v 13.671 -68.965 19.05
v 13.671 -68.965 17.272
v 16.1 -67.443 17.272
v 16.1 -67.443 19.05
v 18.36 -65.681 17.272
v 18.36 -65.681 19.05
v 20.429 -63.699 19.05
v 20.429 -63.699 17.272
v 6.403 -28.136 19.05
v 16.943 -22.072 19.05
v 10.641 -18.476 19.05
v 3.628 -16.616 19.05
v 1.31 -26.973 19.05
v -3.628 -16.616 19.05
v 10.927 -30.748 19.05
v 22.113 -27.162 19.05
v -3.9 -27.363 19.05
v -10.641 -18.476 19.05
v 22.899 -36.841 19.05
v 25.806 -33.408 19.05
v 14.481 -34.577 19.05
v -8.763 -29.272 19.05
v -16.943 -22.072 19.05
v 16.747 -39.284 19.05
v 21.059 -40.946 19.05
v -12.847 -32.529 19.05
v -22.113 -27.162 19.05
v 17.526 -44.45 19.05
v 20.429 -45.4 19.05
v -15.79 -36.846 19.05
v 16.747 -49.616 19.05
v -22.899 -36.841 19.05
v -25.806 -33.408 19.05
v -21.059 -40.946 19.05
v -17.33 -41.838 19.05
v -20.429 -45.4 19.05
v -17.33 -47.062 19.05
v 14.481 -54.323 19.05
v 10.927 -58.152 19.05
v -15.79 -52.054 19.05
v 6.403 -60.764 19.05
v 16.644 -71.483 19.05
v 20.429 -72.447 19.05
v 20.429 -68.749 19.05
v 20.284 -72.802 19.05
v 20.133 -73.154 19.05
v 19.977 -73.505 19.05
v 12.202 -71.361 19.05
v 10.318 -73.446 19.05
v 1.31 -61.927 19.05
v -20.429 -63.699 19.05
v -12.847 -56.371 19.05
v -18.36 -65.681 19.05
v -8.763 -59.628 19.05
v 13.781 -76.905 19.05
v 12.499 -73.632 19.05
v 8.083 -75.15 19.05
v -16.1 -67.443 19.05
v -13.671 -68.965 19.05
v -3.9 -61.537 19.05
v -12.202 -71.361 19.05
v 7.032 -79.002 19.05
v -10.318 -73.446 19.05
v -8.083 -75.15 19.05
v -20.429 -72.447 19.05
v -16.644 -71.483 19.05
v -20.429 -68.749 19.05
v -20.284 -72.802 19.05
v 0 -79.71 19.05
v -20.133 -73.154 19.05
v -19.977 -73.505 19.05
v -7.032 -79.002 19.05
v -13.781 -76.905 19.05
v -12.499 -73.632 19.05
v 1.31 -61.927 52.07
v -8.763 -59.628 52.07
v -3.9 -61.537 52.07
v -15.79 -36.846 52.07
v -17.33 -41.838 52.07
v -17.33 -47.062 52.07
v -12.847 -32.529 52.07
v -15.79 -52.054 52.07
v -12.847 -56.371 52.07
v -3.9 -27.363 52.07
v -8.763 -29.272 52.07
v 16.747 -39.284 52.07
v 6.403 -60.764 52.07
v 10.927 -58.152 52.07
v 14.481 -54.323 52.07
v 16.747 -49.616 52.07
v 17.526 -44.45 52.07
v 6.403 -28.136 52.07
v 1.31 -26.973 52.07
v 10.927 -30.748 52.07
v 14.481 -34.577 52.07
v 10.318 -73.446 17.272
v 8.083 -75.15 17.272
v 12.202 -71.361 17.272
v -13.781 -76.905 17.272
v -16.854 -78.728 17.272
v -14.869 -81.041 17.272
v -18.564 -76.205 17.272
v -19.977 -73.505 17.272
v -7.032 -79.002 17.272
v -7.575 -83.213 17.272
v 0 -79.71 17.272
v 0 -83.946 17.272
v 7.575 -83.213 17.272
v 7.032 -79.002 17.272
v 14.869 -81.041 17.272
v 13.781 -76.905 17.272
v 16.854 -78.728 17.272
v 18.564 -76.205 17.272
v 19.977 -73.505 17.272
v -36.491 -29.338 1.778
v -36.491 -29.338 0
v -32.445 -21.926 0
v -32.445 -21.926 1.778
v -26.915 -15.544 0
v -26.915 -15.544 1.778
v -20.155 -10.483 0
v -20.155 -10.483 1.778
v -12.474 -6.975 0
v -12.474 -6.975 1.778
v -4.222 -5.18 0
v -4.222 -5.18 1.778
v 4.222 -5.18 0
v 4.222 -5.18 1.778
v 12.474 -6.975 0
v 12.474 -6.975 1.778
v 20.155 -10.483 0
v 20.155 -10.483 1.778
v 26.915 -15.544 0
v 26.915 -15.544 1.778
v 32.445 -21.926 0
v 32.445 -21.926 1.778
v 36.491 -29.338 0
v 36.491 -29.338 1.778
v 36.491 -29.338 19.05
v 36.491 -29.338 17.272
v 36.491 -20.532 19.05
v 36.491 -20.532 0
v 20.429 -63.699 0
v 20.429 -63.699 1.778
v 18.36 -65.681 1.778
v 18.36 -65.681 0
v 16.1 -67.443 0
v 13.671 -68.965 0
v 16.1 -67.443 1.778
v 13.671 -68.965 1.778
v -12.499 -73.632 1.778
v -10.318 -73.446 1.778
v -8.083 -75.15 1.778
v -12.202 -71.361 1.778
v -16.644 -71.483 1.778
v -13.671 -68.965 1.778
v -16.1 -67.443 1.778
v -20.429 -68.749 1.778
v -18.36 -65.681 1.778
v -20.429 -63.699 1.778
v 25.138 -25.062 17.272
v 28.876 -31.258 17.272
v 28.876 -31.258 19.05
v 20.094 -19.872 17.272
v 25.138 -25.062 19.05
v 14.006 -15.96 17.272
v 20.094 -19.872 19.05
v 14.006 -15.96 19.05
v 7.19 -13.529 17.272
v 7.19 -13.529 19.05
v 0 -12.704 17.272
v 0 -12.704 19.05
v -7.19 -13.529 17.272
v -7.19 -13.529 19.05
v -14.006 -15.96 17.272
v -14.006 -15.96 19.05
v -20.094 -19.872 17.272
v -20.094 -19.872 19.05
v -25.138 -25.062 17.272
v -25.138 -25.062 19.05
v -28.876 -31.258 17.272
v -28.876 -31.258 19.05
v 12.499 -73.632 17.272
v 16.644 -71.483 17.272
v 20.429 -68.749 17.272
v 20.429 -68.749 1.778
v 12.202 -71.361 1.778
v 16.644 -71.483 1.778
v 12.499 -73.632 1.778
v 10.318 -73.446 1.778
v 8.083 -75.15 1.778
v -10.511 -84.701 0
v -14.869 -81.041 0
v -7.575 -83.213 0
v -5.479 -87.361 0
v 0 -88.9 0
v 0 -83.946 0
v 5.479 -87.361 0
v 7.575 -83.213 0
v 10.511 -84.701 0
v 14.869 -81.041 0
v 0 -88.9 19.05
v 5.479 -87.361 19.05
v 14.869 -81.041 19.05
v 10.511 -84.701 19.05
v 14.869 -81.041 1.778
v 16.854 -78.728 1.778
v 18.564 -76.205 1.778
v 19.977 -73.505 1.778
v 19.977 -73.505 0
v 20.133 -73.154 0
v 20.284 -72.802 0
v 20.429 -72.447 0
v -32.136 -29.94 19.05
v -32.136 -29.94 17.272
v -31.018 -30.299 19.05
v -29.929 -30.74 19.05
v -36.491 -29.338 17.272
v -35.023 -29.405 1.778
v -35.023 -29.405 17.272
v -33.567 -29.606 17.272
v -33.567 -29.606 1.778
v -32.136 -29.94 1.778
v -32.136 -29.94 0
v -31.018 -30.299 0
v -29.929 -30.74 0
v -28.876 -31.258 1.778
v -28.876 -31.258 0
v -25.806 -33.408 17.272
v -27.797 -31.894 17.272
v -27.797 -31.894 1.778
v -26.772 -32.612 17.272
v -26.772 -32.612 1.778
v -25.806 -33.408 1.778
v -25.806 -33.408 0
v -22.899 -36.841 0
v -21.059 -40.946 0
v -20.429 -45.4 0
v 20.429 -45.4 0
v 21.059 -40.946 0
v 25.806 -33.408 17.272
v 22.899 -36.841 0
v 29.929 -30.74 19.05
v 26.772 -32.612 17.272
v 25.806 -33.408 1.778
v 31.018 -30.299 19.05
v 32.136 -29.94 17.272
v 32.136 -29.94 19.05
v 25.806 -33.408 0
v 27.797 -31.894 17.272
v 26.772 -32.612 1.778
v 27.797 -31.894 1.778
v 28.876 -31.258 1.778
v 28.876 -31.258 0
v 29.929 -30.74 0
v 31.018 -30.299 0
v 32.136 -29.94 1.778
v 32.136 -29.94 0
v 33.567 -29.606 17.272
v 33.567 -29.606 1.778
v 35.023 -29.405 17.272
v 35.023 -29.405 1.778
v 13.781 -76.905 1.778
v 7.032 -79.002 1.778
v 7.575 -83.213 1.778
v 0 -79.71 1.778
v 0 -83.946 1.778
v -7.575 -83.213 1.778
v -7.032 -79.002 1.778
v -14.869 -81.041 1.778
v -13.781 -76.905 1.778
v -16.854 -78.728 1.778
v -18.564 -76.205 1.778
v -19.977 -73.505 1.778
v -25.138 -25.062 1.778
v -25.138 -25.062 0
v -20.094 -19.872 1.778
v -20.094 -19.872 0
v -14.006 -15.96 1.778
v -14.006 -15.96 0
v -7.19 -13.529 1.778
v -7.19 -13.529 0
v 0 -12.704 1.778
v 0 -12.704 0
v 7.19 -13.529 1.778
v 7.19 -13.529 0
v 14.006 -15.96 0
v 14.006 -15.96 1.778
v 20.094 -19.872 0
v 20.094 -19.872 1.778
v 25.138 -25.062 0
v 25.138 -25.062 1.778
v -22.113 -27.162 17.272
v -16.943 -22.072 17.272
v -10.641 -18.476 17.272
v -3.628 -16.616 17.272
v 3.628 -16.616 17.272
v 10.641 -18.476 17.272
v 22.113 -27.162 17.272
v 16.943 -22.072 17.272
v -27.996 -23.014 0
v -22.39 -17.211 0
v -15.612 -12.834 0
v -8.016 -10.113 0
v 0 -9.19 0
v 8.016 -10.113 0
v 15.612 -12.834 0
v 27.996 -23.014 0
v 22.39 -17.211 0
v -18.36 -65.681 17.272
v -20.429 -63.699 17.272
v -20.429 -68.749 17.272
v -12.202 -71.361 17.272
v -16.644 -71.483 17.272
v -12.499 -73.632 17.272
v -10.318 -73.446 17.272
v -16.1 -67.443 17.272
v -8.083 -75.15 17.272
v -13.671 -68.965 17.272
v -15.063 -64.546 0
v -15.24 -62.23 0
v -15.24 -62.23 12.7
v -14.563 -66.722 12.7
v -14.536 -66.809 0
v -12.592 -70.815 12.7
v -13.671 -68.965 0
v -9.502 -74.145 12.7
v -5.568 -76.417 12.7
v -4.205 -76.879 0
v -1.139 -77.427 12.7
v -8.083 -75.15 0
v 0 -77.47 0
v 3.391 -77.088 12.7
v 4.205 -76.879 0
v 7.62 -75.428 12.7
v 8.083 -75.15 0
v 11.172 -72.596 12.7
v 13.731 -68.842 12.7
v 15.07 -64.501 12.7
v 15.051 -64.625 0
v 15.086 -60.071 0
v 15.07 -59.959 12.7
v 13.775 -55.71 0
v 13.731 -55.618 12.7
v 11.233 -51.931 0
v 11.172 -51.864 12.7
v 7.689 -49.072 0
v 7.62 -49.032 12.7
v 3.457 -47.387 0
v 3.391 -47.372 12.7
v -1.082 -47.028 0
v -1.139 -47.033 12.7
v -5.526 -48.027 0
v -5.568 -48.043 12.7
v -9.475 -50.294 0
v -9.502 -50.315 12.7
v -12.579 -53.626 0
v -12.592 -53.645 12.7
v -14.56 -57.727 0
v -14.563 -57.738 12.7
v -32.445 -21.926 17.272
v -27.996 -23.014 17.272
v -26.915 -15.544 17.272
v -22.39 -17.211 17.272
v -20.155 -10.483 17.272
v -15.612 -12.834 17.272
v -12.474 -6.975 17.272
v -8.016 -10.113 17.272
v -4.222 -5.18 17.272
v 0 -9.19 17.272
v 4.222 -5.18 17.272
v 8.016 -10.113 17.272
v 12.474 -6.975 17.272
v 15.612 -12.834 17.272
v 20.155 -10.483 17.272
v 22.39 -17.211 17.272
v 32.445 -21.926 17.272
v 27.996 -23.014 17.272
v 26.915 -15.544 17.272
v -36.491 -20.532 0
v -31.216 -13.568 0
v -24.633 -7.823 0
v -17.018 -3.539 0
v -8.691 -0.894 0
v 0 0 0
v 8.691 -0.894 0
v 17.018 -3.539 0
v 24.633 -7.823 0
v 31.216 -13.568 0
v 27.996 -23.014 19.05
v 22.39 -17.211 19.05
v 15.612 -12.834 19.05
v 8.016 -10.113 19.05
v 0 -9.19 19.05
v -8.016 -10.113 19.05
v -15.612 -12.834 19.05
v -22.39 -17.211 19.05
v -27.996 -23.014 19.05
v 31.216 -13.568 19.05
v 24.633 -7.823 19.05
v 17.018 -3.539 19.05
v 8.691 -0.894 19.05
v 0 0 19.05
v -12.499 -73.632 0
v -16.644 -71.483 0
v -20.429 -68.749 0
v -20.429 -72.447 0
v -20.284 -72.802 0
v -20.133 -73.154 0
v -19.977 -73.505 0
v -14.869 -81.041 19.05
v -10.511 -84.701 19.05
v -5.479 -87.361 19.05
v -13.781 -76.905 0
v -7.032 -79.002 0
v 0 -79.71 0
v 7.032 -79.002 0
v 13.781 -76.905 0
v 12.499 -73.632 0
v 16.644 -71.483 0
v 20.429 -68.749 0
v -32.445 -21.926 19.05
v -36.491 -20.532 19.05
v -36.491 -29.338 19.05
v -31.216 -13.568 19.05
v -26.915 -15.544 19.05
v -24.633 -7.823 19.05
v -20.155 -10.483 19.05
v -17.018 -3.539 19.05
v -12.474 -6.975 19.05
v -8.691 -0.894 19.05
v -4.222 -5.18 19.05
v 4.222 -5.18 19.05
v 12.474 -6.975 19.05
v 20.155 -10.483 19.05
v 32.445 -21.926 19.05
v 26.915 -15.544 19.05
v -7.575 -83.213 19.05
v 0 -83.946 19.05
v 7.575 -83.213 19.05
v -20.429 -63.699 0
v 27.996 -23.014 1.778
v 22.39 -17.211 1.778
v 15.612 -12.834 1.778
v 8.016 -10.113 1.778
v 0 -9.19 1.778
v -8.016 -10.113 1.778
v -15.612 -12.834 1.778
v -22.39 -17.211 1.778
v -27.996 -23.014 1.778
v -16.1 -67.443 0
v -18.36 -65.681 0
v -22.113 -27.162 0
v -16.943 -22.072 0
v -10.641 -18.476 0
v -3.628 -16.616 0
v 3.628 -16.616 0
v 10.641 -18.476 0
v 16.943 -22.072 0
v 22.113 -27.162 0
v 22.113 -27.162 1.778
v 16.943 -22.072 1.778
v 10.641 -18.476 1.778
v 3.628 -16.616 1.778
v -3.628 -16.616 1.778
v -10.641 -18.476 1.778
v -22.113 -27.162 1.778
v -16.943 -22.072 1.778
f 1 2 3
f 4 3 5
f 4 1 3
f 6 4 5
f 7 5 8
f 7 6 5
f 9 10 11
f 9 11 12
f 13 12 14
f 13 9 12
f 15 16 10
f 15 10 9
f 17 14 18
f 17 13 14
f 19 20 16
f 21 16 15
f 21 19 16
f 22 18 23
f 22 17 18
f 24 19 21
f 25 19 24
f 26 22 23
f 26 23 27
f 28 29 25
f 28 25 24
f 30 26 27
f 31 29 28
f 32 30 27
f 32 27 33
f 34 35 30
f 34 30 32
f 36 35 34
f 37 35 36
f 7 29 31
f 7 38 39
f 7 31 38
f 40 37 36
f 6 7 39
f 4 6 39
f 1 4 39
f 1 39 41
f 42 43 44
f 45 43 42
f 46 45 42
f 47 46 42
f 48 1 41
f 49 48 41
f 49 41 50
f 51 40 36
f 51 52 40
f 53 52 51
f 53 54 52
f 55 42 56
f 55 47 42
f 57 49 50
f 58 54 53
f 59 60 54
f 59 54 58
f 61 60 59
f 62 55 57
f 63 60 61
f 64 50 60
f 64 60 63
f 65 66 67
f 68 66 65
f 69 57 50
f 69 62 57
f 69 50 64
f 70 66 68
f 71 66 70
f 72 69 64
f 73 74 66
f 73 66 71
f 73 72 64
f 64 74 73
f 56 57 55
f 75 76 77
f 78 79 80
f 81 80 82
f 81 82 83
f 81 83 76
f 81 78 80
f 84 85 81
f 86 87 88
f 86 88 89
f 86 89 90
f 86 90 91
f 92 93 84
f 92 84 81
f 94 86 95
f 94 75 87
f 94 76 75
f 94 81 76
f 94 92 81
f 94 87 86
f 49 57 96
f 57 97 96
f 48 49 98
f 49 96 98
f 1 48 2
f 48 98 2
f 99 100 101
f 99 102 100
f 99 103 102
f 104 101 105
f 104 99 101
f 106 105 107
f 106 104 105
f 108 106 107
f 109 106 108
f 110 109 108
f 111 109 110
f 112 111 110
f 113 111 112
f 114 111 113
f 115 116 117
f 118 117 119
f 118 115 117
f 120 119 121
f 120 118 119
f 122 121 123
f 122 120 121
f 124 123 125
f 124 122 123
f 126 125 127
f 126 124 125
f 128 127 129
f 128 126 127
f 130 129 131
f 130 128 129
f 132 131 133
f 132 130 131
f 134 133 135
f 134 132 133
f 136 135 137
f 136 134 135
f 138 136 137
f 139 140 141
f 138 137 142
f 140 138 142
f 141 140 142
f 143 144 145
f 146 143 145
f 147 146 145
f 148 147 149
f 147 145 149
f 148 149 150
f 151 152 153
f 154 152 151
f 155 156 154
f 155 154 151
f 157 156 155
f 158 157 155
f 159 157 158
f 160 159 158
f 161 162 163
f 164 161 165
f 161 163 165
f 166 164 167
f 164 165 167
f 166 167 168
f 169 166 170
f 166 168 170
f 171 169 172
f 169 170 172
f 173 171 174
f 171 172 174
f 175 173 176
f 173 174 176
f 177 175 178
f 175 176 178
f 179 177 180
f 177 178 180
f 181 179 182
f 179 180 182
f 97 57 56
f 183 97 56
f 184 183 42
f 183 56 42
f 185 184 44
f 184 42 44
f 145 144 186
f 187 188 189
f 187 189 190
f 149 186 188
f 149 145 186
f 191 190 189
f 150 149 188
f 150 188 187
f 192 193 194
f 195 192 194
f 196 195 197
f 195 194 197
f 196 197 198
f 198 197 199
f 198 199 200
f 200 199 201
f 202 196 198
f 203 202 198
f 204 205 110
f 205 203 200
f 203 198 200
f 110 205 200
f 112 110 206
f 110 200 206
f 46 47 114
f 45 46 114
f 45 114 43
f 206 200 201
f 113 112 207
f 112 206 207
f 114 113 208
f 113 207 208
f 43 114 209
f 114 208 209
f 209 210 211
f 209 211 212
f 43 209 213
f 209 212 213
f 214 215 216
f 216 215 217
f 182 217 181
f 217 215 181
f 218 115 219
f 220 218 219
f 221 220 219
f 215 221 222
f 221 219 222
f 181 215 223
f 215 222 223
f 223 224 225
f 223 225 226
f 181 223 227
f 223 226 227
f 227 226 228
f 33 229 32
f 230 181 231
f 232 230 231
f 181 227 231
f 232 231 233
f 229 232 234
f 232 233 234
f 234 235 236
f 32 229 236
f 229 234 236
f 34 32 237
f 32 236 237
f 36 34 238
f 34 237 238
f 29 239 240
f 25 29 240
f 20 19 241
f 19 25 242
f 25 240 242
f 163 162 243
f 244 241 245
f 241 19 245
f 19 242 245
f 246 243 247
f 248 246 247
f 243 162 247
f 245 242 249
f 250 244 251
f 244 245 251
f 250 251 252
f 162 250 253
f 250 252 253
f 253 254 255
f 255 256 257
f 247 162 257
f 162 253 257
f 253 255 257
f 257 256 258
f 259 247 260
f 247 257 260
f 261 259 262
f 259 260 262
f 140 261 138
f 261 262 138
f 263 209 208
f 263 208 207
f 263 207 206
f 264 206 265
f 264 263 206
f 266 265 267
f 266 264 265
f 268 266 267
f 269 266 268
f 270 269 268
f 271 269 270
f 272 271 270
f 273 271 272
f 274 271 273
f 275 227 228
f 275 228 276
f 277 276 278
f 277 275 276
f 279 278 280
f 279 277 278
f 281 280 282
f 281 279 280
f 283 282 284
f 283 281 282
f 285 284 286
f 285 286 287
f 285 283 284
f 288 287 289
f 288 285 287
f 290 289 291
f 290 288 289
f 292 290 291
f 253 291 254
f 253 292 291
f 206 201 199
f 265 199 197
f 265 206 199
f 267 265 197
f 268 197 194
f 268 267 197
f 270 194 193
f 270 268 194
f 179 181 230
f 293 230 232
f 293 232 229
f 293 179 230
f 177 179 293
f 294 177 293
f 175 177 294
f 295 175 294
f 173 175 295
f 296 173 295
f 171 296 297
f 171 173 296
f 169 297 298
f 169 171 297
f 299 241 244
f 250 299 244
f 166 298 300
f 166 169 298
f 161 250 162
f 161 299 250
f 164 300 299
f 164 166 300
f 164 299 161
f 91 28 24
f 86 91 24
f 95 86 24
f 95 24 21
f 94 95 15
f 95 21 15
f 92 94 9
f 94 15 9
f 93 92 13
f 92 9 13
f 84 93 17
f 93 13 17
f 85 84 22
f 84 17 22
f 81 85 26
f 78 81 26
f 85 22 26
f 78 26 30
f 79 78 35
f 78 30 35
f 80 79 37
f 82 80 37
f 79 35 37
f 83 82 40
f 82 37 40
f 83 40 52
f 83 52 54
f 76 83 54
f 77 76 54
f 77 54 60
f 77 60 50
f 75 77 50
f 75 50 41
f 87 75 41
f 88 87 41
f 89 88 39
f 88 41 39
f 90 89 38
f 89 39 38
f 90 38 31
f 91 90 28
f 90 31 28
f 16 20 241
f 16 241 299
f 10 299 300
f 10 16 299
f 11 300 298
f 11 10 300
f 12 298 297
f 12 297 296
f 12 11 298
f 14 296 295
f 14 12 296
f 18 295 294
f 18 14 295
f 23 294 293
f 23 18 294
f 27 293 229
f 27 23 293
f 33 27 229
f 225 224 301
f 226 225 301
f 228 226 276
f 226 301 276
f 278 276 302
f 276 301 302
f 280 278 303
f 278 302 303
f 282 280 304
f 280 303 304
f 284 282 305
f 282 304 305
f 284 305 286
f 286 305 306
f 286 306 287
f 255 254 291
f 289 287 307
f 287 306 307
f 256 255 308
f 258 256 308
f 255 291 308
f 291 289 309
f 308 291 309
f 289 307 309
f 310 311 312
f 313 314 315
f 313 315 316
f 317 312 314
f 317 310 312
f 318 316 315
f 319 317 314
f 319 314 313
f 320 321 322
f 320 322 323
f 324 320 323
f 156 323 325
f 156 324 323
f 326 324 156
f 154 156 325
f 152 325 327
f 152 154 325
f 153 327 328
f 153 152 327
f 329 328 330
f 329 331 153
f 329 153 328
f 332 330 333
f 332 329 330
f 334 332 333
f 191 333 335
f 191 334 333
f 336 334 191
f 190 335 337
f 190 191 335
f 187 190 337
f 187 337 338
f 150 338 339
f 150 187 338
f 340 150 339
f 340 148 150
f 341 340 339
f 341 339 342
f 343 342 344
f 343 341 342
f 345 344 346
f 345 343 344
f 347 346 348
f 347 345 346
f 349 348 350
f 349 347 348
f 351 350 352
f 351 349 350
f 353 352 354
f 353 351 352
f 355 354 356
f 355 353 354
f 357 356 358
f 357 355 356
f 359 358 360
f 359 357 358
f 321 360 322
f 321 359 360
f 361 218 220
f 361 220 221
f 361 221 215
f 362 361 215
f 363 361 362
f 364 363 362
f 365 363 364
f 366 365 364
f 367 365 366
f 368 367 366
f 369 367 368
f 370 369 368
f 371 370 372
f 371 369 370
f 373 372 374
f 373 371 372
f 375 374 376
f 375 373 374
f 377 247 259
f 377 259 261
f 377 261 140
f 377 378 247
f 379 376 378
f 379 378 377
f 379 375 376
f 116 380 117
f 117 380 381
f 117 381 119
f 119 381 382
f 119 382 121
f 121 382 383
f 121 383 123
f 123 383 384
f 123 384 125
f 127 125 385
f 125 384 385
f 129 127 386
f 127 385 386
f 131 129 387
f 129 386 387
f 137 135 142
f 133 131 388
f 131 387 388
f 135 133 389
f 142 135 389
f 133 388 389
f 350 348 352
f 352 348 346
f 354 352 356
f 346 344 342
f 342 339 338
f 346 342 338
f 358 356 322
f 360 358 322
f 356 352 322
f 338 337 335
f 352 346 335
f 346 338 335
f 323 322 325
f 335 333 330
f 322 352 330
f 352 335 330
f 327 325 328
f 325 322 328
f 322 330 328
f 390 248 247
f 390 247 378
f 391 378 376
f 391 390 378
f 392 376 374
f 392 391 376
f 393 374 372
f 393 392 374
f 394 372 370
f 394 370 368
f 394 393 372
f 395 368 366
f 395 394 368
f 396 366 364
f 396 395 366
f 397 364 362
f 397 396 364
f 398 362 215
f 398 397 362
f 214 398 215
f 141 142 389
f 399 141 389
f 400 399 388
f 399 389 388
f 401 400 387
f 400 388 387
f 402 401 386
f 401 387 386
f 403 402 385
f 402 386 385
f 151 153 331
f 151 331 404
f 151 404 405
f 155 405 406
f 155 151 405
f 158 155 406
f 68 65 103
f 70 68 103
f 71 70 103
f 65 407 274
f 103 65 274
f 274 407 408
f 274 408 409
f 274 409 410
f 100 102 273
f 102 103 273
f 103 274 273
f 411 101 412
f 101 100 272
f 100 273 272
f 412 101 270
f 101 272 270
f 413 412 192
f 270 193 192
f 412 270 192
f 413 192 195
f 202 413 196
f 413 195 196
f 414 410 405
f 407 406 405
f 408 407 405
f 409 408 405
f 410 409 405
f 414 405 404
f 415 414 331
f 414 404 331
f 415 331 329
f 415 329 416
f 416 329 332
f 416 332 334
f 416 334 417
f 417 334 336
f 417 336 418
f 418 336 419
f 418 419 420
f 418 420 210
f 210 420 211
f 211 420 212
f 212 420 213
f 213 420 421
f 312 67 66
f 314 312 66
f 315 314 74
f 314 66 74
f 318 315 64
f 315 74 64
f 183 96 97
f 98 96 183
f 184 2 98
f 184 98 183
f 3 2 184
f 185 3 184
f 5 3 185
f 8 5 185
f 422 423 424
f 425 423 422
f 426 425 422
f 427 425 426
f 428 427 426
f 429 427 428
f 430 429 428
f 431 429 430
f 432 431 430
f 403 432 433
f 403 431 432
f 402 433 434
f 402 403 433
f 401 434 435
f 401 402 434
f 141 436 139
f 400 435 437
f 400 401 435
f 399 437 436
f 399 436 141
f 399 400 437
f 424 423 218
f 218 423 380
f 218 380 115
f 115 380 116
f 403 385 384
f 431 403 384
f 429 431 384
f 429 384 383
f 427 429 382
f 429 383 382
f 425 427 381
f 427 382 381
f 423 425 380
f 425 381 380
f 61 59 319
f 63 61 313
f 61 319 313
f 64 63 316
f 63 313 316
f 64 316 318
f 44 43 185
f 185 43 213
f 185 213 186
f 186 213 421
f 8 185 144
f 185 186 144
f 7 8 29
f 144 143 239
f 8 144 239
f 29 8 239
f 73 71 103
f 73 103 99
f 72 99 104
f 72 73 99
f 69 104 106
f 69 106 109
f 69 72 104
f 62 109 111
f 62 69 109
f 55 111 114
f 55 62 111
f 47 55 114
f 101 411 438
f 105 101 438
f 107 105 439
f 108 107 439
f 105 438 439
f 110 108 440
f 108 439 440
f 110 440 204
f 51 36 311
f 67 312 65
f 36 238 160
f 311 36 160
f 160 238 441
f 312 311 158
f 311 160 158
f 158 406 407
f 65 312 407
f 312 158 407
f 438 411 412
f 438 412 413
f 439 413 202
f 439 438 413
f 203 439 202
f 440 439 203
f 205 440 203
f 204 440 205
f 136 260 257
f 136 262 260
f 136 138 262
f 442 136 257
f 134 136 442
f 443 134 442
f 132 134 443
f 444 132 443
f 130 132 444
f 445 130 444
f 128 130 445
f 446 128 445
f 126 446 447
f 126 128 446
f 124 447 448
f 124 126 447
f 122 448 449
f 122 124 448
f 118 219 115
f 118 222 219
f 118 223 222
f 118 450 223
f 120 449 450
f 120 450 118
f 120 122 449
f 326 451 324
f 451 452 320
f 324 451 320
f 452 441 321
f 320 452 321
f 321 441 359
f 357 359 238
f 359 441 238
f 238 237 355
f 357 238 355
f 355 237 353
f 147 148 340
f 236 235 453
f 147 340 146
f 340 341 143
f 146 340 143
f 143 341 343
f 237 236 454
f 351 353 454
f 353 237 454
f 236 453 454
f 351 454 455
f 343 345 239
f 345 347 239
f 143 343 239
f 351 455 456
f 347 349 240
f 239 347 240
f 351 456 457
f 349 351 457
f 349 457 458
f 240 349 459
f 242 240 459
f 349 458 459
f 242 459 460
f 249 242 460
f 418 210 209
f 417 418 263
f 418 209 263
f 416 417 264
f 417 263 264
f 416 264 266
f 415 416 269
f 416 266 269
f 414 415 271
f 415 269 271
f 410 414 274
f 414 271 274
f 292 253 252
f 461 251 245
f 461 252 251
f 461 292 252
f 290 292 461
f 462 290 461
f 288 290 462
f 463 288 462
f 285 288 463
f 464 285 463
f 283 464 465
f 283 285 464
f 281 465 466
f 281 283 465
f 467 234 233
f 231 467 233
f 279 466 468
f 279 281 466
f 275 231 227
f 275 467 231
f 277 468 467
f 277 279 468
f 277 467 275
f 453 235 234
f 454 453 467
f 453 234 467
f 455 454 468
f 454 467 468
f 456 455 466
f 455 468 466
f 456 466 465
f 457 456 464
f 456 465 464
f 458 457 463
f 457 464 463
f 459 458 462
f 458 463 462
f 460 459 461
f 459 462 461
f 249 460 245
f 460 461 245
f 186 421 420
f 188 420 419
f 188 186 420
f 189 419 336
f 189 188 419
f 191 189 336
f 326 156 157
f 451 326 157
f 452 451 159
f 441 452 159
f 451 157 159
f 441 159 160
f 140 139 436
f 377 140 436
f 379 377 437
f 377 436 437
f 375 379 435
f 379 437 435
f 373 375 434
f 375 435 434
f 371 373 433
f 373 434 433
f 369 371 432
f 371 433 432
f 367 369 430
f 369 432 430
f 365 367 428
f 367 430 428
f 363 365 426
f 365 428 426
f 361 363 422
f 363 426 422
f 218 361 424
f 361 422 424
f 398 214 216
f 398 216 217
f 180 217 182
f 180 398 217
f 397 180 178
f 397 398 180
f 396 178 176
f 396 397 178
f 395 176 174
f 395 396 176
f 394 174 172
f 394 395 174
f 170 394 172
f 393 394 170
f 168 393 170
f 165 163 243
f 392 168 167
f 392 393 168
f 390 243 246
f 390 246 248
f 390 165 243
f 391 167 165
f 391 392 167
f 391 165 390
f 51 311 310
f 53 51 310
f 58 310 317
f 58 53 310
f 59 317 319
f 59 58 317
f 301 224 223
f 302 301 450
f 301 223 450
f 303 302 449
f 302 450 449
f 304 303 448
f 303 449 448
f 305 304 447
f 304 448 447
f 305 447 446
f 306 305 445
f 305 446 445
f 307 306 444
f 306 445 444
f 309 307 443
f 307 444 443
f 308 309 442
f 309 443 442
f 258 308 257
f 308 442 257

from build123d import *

# Parameters (mm, degrees)
SKETCH2_R           = 15.24
BOSS_EXTRUDE2_DEPTH = 19.05
SKETCH3_R           = 39.496431486
SKETCH3_R_2         = 35.260007957
CUT_EXTRUDE2_DEPTH  = 1.778
SKETCH4_R           = 31.746180351
SKETCH4_R_2         = 28.068999156
CUT_EXTRUDE3_DEPTH  = 1.778
CUT_EXTRUDE4_START  = -1.778
SKETCH5_R           = 39.496431486
SKETCH5_R_2         = 35.260007957
CUT_EXTRUDE4_DEPTH  = 1.778
CUT_EXTRUDE5_START  = -1.778
SKETCH7_R           = 31.746180351
SKETCH7_R_2         = 28.068999156
CUT_EXTRUDE5_DEPTH  = 1.778
BOSS_EXTRUDE3_START = -6.35
SKETCH9_R           = 15.24
BOSS_EXTRUDE3_DEPTH = 6.35
SKETCH10_R          = 17.526
BOSS_EXTRUDE4_DEPTH = 33.02


with BuildPart() as part:
    # Sketch2 → Boss-Extrude2 (new body)
    with BuildSketch(Plane.XY):
        with BuildLine():
            Line((20.429296249, -72.446914532), (20.429296249, -45.399816154))
            ThreePointArc((20.429296249, -45.399816154), (25.133677026, -34.04243628), (36.4910569, -29.338055504))
            Line((36.4910569, -29.338055504), (36.4910569, -20.532405534))
            ThreePointArc((36.4910569, -20.532405534), (20.935477727, -5.485511485), (0, 0))
            ThreePointArc((0, 0), (-20.935477727, -5.485511485), (-36.4910569, -20.532405534))
            Line((-36.4910569, -20.532405534), (-36.4910569, -29.338055504))
            ThreePointArc((-36.4910569, -29.338055504), (-25.133677026, -34.04243628), (-20.429296249, -45.399816154))
            Line((-20.429296249, -45.399816154), (-20.429296249, -72.446914532))
            ThreePointArc((-20.429296249, -72.446914532), (-12.360356233, -83.33771782), (0, -88.9))
            ThreePointArc((0, -88.9), (12.360356233, -83.33771782), (20.429296249, -72.446914532))
        make_face()
        with Locations(Location((0, -62.23, 0), (0, 0, 180))):
            Circle(SKETCH2_R, mode=Mode.SUBTRACT)
    extrude(amount=BOSS_EXTRUDE2_DEPTH)

    # Sketch3 → Cut-Extrude2 (cut)
    with BuildSketch(Plane.XY.offset(19.05)):
        with Locations((0, -44.45)):
            Circle(SKETCH3_R)
        with Locations((0, -44.45)):
            Circle(SKETCH3_R_2, mode=Mode.SUBTRACT)
    extrude(amount=-CUT_EXTRUDE2_DEPTH, mode=Mode.SUBTRACT)

    # Sketch4 → Cut-Extrude3 (cut)
    with BuildSketch(Plane.XY.offset(19.05)):
        with Locations((0, -44.45)):
            Circle(SKETCH4_R)
        with Locations((0, -44.45)):
            Circle(SKETCH4_R_2, mode=Mode.SUBTRACT)
    extrude(amount=-CUT_EXTRUDE3_DEPTH, mode=Mode.SUBTRACT)

    # Sketch5 → Cut-Extrude4 (cut)
    with BuildSketch(Plane(origin=(0, 0, 0), x_dir=(-1, 0, 0), z_dir=(0, 0, -1)).offset(CUT_EXTRUDE4_START)):
        with Locations((0, -44.45)):
            Circle(SKETCH5_R)
        with Locations((0, -44.45)):
            Circle(SKETCH5_R_2, mode=Mode.SUBTRACT)
    extrude(amount=CUT_EXTRUDE4_DEPTH, mode=Mode.SUBTRACT)

    # Sketch7 → Cut-Extrude5 (cut)
    with BuildSketch(Plane(origin=(0, 0, 0), x_dir=(-1, 0, 0), z_dir=(0, 0, -1)).offset(CUT_EXTRUDE5_START)):
        with Locations((0, -44.45)):
            Circle(SKETCH7_R)
        with Locations((0, -44.45)):
            Circle(SKETCH7_R_2, mode=Mode.SUBTRACT)
    extrude(amount=CUT_EXTRUDE5_DEPTH, mode=Mode.SUBTRACT)

    # Sketch9 → Boss-Extrude3 (add)
    with BuildSketch(Plane.XY.offset(19.05).offset(BOSS_EXTRUDE3_START)):
        with Locations(Location((0, -62.23, 0), (0, 0, 206.225395775))):
            Circle(SKETCH9_R)
    extrude(amount=BOSS_EXTRUDE3_DEPTH)

    # Sketch10 → Boss-Extrude4 (add)
    with BuildSketch(Plane.XY.offset(19.05)):
        with Locations((0, -44.45)):
            Circle(SKETCH10_R)
    extrude(amount=BOSS_EXTRUDE4_DEPTH)


solid = part.part
